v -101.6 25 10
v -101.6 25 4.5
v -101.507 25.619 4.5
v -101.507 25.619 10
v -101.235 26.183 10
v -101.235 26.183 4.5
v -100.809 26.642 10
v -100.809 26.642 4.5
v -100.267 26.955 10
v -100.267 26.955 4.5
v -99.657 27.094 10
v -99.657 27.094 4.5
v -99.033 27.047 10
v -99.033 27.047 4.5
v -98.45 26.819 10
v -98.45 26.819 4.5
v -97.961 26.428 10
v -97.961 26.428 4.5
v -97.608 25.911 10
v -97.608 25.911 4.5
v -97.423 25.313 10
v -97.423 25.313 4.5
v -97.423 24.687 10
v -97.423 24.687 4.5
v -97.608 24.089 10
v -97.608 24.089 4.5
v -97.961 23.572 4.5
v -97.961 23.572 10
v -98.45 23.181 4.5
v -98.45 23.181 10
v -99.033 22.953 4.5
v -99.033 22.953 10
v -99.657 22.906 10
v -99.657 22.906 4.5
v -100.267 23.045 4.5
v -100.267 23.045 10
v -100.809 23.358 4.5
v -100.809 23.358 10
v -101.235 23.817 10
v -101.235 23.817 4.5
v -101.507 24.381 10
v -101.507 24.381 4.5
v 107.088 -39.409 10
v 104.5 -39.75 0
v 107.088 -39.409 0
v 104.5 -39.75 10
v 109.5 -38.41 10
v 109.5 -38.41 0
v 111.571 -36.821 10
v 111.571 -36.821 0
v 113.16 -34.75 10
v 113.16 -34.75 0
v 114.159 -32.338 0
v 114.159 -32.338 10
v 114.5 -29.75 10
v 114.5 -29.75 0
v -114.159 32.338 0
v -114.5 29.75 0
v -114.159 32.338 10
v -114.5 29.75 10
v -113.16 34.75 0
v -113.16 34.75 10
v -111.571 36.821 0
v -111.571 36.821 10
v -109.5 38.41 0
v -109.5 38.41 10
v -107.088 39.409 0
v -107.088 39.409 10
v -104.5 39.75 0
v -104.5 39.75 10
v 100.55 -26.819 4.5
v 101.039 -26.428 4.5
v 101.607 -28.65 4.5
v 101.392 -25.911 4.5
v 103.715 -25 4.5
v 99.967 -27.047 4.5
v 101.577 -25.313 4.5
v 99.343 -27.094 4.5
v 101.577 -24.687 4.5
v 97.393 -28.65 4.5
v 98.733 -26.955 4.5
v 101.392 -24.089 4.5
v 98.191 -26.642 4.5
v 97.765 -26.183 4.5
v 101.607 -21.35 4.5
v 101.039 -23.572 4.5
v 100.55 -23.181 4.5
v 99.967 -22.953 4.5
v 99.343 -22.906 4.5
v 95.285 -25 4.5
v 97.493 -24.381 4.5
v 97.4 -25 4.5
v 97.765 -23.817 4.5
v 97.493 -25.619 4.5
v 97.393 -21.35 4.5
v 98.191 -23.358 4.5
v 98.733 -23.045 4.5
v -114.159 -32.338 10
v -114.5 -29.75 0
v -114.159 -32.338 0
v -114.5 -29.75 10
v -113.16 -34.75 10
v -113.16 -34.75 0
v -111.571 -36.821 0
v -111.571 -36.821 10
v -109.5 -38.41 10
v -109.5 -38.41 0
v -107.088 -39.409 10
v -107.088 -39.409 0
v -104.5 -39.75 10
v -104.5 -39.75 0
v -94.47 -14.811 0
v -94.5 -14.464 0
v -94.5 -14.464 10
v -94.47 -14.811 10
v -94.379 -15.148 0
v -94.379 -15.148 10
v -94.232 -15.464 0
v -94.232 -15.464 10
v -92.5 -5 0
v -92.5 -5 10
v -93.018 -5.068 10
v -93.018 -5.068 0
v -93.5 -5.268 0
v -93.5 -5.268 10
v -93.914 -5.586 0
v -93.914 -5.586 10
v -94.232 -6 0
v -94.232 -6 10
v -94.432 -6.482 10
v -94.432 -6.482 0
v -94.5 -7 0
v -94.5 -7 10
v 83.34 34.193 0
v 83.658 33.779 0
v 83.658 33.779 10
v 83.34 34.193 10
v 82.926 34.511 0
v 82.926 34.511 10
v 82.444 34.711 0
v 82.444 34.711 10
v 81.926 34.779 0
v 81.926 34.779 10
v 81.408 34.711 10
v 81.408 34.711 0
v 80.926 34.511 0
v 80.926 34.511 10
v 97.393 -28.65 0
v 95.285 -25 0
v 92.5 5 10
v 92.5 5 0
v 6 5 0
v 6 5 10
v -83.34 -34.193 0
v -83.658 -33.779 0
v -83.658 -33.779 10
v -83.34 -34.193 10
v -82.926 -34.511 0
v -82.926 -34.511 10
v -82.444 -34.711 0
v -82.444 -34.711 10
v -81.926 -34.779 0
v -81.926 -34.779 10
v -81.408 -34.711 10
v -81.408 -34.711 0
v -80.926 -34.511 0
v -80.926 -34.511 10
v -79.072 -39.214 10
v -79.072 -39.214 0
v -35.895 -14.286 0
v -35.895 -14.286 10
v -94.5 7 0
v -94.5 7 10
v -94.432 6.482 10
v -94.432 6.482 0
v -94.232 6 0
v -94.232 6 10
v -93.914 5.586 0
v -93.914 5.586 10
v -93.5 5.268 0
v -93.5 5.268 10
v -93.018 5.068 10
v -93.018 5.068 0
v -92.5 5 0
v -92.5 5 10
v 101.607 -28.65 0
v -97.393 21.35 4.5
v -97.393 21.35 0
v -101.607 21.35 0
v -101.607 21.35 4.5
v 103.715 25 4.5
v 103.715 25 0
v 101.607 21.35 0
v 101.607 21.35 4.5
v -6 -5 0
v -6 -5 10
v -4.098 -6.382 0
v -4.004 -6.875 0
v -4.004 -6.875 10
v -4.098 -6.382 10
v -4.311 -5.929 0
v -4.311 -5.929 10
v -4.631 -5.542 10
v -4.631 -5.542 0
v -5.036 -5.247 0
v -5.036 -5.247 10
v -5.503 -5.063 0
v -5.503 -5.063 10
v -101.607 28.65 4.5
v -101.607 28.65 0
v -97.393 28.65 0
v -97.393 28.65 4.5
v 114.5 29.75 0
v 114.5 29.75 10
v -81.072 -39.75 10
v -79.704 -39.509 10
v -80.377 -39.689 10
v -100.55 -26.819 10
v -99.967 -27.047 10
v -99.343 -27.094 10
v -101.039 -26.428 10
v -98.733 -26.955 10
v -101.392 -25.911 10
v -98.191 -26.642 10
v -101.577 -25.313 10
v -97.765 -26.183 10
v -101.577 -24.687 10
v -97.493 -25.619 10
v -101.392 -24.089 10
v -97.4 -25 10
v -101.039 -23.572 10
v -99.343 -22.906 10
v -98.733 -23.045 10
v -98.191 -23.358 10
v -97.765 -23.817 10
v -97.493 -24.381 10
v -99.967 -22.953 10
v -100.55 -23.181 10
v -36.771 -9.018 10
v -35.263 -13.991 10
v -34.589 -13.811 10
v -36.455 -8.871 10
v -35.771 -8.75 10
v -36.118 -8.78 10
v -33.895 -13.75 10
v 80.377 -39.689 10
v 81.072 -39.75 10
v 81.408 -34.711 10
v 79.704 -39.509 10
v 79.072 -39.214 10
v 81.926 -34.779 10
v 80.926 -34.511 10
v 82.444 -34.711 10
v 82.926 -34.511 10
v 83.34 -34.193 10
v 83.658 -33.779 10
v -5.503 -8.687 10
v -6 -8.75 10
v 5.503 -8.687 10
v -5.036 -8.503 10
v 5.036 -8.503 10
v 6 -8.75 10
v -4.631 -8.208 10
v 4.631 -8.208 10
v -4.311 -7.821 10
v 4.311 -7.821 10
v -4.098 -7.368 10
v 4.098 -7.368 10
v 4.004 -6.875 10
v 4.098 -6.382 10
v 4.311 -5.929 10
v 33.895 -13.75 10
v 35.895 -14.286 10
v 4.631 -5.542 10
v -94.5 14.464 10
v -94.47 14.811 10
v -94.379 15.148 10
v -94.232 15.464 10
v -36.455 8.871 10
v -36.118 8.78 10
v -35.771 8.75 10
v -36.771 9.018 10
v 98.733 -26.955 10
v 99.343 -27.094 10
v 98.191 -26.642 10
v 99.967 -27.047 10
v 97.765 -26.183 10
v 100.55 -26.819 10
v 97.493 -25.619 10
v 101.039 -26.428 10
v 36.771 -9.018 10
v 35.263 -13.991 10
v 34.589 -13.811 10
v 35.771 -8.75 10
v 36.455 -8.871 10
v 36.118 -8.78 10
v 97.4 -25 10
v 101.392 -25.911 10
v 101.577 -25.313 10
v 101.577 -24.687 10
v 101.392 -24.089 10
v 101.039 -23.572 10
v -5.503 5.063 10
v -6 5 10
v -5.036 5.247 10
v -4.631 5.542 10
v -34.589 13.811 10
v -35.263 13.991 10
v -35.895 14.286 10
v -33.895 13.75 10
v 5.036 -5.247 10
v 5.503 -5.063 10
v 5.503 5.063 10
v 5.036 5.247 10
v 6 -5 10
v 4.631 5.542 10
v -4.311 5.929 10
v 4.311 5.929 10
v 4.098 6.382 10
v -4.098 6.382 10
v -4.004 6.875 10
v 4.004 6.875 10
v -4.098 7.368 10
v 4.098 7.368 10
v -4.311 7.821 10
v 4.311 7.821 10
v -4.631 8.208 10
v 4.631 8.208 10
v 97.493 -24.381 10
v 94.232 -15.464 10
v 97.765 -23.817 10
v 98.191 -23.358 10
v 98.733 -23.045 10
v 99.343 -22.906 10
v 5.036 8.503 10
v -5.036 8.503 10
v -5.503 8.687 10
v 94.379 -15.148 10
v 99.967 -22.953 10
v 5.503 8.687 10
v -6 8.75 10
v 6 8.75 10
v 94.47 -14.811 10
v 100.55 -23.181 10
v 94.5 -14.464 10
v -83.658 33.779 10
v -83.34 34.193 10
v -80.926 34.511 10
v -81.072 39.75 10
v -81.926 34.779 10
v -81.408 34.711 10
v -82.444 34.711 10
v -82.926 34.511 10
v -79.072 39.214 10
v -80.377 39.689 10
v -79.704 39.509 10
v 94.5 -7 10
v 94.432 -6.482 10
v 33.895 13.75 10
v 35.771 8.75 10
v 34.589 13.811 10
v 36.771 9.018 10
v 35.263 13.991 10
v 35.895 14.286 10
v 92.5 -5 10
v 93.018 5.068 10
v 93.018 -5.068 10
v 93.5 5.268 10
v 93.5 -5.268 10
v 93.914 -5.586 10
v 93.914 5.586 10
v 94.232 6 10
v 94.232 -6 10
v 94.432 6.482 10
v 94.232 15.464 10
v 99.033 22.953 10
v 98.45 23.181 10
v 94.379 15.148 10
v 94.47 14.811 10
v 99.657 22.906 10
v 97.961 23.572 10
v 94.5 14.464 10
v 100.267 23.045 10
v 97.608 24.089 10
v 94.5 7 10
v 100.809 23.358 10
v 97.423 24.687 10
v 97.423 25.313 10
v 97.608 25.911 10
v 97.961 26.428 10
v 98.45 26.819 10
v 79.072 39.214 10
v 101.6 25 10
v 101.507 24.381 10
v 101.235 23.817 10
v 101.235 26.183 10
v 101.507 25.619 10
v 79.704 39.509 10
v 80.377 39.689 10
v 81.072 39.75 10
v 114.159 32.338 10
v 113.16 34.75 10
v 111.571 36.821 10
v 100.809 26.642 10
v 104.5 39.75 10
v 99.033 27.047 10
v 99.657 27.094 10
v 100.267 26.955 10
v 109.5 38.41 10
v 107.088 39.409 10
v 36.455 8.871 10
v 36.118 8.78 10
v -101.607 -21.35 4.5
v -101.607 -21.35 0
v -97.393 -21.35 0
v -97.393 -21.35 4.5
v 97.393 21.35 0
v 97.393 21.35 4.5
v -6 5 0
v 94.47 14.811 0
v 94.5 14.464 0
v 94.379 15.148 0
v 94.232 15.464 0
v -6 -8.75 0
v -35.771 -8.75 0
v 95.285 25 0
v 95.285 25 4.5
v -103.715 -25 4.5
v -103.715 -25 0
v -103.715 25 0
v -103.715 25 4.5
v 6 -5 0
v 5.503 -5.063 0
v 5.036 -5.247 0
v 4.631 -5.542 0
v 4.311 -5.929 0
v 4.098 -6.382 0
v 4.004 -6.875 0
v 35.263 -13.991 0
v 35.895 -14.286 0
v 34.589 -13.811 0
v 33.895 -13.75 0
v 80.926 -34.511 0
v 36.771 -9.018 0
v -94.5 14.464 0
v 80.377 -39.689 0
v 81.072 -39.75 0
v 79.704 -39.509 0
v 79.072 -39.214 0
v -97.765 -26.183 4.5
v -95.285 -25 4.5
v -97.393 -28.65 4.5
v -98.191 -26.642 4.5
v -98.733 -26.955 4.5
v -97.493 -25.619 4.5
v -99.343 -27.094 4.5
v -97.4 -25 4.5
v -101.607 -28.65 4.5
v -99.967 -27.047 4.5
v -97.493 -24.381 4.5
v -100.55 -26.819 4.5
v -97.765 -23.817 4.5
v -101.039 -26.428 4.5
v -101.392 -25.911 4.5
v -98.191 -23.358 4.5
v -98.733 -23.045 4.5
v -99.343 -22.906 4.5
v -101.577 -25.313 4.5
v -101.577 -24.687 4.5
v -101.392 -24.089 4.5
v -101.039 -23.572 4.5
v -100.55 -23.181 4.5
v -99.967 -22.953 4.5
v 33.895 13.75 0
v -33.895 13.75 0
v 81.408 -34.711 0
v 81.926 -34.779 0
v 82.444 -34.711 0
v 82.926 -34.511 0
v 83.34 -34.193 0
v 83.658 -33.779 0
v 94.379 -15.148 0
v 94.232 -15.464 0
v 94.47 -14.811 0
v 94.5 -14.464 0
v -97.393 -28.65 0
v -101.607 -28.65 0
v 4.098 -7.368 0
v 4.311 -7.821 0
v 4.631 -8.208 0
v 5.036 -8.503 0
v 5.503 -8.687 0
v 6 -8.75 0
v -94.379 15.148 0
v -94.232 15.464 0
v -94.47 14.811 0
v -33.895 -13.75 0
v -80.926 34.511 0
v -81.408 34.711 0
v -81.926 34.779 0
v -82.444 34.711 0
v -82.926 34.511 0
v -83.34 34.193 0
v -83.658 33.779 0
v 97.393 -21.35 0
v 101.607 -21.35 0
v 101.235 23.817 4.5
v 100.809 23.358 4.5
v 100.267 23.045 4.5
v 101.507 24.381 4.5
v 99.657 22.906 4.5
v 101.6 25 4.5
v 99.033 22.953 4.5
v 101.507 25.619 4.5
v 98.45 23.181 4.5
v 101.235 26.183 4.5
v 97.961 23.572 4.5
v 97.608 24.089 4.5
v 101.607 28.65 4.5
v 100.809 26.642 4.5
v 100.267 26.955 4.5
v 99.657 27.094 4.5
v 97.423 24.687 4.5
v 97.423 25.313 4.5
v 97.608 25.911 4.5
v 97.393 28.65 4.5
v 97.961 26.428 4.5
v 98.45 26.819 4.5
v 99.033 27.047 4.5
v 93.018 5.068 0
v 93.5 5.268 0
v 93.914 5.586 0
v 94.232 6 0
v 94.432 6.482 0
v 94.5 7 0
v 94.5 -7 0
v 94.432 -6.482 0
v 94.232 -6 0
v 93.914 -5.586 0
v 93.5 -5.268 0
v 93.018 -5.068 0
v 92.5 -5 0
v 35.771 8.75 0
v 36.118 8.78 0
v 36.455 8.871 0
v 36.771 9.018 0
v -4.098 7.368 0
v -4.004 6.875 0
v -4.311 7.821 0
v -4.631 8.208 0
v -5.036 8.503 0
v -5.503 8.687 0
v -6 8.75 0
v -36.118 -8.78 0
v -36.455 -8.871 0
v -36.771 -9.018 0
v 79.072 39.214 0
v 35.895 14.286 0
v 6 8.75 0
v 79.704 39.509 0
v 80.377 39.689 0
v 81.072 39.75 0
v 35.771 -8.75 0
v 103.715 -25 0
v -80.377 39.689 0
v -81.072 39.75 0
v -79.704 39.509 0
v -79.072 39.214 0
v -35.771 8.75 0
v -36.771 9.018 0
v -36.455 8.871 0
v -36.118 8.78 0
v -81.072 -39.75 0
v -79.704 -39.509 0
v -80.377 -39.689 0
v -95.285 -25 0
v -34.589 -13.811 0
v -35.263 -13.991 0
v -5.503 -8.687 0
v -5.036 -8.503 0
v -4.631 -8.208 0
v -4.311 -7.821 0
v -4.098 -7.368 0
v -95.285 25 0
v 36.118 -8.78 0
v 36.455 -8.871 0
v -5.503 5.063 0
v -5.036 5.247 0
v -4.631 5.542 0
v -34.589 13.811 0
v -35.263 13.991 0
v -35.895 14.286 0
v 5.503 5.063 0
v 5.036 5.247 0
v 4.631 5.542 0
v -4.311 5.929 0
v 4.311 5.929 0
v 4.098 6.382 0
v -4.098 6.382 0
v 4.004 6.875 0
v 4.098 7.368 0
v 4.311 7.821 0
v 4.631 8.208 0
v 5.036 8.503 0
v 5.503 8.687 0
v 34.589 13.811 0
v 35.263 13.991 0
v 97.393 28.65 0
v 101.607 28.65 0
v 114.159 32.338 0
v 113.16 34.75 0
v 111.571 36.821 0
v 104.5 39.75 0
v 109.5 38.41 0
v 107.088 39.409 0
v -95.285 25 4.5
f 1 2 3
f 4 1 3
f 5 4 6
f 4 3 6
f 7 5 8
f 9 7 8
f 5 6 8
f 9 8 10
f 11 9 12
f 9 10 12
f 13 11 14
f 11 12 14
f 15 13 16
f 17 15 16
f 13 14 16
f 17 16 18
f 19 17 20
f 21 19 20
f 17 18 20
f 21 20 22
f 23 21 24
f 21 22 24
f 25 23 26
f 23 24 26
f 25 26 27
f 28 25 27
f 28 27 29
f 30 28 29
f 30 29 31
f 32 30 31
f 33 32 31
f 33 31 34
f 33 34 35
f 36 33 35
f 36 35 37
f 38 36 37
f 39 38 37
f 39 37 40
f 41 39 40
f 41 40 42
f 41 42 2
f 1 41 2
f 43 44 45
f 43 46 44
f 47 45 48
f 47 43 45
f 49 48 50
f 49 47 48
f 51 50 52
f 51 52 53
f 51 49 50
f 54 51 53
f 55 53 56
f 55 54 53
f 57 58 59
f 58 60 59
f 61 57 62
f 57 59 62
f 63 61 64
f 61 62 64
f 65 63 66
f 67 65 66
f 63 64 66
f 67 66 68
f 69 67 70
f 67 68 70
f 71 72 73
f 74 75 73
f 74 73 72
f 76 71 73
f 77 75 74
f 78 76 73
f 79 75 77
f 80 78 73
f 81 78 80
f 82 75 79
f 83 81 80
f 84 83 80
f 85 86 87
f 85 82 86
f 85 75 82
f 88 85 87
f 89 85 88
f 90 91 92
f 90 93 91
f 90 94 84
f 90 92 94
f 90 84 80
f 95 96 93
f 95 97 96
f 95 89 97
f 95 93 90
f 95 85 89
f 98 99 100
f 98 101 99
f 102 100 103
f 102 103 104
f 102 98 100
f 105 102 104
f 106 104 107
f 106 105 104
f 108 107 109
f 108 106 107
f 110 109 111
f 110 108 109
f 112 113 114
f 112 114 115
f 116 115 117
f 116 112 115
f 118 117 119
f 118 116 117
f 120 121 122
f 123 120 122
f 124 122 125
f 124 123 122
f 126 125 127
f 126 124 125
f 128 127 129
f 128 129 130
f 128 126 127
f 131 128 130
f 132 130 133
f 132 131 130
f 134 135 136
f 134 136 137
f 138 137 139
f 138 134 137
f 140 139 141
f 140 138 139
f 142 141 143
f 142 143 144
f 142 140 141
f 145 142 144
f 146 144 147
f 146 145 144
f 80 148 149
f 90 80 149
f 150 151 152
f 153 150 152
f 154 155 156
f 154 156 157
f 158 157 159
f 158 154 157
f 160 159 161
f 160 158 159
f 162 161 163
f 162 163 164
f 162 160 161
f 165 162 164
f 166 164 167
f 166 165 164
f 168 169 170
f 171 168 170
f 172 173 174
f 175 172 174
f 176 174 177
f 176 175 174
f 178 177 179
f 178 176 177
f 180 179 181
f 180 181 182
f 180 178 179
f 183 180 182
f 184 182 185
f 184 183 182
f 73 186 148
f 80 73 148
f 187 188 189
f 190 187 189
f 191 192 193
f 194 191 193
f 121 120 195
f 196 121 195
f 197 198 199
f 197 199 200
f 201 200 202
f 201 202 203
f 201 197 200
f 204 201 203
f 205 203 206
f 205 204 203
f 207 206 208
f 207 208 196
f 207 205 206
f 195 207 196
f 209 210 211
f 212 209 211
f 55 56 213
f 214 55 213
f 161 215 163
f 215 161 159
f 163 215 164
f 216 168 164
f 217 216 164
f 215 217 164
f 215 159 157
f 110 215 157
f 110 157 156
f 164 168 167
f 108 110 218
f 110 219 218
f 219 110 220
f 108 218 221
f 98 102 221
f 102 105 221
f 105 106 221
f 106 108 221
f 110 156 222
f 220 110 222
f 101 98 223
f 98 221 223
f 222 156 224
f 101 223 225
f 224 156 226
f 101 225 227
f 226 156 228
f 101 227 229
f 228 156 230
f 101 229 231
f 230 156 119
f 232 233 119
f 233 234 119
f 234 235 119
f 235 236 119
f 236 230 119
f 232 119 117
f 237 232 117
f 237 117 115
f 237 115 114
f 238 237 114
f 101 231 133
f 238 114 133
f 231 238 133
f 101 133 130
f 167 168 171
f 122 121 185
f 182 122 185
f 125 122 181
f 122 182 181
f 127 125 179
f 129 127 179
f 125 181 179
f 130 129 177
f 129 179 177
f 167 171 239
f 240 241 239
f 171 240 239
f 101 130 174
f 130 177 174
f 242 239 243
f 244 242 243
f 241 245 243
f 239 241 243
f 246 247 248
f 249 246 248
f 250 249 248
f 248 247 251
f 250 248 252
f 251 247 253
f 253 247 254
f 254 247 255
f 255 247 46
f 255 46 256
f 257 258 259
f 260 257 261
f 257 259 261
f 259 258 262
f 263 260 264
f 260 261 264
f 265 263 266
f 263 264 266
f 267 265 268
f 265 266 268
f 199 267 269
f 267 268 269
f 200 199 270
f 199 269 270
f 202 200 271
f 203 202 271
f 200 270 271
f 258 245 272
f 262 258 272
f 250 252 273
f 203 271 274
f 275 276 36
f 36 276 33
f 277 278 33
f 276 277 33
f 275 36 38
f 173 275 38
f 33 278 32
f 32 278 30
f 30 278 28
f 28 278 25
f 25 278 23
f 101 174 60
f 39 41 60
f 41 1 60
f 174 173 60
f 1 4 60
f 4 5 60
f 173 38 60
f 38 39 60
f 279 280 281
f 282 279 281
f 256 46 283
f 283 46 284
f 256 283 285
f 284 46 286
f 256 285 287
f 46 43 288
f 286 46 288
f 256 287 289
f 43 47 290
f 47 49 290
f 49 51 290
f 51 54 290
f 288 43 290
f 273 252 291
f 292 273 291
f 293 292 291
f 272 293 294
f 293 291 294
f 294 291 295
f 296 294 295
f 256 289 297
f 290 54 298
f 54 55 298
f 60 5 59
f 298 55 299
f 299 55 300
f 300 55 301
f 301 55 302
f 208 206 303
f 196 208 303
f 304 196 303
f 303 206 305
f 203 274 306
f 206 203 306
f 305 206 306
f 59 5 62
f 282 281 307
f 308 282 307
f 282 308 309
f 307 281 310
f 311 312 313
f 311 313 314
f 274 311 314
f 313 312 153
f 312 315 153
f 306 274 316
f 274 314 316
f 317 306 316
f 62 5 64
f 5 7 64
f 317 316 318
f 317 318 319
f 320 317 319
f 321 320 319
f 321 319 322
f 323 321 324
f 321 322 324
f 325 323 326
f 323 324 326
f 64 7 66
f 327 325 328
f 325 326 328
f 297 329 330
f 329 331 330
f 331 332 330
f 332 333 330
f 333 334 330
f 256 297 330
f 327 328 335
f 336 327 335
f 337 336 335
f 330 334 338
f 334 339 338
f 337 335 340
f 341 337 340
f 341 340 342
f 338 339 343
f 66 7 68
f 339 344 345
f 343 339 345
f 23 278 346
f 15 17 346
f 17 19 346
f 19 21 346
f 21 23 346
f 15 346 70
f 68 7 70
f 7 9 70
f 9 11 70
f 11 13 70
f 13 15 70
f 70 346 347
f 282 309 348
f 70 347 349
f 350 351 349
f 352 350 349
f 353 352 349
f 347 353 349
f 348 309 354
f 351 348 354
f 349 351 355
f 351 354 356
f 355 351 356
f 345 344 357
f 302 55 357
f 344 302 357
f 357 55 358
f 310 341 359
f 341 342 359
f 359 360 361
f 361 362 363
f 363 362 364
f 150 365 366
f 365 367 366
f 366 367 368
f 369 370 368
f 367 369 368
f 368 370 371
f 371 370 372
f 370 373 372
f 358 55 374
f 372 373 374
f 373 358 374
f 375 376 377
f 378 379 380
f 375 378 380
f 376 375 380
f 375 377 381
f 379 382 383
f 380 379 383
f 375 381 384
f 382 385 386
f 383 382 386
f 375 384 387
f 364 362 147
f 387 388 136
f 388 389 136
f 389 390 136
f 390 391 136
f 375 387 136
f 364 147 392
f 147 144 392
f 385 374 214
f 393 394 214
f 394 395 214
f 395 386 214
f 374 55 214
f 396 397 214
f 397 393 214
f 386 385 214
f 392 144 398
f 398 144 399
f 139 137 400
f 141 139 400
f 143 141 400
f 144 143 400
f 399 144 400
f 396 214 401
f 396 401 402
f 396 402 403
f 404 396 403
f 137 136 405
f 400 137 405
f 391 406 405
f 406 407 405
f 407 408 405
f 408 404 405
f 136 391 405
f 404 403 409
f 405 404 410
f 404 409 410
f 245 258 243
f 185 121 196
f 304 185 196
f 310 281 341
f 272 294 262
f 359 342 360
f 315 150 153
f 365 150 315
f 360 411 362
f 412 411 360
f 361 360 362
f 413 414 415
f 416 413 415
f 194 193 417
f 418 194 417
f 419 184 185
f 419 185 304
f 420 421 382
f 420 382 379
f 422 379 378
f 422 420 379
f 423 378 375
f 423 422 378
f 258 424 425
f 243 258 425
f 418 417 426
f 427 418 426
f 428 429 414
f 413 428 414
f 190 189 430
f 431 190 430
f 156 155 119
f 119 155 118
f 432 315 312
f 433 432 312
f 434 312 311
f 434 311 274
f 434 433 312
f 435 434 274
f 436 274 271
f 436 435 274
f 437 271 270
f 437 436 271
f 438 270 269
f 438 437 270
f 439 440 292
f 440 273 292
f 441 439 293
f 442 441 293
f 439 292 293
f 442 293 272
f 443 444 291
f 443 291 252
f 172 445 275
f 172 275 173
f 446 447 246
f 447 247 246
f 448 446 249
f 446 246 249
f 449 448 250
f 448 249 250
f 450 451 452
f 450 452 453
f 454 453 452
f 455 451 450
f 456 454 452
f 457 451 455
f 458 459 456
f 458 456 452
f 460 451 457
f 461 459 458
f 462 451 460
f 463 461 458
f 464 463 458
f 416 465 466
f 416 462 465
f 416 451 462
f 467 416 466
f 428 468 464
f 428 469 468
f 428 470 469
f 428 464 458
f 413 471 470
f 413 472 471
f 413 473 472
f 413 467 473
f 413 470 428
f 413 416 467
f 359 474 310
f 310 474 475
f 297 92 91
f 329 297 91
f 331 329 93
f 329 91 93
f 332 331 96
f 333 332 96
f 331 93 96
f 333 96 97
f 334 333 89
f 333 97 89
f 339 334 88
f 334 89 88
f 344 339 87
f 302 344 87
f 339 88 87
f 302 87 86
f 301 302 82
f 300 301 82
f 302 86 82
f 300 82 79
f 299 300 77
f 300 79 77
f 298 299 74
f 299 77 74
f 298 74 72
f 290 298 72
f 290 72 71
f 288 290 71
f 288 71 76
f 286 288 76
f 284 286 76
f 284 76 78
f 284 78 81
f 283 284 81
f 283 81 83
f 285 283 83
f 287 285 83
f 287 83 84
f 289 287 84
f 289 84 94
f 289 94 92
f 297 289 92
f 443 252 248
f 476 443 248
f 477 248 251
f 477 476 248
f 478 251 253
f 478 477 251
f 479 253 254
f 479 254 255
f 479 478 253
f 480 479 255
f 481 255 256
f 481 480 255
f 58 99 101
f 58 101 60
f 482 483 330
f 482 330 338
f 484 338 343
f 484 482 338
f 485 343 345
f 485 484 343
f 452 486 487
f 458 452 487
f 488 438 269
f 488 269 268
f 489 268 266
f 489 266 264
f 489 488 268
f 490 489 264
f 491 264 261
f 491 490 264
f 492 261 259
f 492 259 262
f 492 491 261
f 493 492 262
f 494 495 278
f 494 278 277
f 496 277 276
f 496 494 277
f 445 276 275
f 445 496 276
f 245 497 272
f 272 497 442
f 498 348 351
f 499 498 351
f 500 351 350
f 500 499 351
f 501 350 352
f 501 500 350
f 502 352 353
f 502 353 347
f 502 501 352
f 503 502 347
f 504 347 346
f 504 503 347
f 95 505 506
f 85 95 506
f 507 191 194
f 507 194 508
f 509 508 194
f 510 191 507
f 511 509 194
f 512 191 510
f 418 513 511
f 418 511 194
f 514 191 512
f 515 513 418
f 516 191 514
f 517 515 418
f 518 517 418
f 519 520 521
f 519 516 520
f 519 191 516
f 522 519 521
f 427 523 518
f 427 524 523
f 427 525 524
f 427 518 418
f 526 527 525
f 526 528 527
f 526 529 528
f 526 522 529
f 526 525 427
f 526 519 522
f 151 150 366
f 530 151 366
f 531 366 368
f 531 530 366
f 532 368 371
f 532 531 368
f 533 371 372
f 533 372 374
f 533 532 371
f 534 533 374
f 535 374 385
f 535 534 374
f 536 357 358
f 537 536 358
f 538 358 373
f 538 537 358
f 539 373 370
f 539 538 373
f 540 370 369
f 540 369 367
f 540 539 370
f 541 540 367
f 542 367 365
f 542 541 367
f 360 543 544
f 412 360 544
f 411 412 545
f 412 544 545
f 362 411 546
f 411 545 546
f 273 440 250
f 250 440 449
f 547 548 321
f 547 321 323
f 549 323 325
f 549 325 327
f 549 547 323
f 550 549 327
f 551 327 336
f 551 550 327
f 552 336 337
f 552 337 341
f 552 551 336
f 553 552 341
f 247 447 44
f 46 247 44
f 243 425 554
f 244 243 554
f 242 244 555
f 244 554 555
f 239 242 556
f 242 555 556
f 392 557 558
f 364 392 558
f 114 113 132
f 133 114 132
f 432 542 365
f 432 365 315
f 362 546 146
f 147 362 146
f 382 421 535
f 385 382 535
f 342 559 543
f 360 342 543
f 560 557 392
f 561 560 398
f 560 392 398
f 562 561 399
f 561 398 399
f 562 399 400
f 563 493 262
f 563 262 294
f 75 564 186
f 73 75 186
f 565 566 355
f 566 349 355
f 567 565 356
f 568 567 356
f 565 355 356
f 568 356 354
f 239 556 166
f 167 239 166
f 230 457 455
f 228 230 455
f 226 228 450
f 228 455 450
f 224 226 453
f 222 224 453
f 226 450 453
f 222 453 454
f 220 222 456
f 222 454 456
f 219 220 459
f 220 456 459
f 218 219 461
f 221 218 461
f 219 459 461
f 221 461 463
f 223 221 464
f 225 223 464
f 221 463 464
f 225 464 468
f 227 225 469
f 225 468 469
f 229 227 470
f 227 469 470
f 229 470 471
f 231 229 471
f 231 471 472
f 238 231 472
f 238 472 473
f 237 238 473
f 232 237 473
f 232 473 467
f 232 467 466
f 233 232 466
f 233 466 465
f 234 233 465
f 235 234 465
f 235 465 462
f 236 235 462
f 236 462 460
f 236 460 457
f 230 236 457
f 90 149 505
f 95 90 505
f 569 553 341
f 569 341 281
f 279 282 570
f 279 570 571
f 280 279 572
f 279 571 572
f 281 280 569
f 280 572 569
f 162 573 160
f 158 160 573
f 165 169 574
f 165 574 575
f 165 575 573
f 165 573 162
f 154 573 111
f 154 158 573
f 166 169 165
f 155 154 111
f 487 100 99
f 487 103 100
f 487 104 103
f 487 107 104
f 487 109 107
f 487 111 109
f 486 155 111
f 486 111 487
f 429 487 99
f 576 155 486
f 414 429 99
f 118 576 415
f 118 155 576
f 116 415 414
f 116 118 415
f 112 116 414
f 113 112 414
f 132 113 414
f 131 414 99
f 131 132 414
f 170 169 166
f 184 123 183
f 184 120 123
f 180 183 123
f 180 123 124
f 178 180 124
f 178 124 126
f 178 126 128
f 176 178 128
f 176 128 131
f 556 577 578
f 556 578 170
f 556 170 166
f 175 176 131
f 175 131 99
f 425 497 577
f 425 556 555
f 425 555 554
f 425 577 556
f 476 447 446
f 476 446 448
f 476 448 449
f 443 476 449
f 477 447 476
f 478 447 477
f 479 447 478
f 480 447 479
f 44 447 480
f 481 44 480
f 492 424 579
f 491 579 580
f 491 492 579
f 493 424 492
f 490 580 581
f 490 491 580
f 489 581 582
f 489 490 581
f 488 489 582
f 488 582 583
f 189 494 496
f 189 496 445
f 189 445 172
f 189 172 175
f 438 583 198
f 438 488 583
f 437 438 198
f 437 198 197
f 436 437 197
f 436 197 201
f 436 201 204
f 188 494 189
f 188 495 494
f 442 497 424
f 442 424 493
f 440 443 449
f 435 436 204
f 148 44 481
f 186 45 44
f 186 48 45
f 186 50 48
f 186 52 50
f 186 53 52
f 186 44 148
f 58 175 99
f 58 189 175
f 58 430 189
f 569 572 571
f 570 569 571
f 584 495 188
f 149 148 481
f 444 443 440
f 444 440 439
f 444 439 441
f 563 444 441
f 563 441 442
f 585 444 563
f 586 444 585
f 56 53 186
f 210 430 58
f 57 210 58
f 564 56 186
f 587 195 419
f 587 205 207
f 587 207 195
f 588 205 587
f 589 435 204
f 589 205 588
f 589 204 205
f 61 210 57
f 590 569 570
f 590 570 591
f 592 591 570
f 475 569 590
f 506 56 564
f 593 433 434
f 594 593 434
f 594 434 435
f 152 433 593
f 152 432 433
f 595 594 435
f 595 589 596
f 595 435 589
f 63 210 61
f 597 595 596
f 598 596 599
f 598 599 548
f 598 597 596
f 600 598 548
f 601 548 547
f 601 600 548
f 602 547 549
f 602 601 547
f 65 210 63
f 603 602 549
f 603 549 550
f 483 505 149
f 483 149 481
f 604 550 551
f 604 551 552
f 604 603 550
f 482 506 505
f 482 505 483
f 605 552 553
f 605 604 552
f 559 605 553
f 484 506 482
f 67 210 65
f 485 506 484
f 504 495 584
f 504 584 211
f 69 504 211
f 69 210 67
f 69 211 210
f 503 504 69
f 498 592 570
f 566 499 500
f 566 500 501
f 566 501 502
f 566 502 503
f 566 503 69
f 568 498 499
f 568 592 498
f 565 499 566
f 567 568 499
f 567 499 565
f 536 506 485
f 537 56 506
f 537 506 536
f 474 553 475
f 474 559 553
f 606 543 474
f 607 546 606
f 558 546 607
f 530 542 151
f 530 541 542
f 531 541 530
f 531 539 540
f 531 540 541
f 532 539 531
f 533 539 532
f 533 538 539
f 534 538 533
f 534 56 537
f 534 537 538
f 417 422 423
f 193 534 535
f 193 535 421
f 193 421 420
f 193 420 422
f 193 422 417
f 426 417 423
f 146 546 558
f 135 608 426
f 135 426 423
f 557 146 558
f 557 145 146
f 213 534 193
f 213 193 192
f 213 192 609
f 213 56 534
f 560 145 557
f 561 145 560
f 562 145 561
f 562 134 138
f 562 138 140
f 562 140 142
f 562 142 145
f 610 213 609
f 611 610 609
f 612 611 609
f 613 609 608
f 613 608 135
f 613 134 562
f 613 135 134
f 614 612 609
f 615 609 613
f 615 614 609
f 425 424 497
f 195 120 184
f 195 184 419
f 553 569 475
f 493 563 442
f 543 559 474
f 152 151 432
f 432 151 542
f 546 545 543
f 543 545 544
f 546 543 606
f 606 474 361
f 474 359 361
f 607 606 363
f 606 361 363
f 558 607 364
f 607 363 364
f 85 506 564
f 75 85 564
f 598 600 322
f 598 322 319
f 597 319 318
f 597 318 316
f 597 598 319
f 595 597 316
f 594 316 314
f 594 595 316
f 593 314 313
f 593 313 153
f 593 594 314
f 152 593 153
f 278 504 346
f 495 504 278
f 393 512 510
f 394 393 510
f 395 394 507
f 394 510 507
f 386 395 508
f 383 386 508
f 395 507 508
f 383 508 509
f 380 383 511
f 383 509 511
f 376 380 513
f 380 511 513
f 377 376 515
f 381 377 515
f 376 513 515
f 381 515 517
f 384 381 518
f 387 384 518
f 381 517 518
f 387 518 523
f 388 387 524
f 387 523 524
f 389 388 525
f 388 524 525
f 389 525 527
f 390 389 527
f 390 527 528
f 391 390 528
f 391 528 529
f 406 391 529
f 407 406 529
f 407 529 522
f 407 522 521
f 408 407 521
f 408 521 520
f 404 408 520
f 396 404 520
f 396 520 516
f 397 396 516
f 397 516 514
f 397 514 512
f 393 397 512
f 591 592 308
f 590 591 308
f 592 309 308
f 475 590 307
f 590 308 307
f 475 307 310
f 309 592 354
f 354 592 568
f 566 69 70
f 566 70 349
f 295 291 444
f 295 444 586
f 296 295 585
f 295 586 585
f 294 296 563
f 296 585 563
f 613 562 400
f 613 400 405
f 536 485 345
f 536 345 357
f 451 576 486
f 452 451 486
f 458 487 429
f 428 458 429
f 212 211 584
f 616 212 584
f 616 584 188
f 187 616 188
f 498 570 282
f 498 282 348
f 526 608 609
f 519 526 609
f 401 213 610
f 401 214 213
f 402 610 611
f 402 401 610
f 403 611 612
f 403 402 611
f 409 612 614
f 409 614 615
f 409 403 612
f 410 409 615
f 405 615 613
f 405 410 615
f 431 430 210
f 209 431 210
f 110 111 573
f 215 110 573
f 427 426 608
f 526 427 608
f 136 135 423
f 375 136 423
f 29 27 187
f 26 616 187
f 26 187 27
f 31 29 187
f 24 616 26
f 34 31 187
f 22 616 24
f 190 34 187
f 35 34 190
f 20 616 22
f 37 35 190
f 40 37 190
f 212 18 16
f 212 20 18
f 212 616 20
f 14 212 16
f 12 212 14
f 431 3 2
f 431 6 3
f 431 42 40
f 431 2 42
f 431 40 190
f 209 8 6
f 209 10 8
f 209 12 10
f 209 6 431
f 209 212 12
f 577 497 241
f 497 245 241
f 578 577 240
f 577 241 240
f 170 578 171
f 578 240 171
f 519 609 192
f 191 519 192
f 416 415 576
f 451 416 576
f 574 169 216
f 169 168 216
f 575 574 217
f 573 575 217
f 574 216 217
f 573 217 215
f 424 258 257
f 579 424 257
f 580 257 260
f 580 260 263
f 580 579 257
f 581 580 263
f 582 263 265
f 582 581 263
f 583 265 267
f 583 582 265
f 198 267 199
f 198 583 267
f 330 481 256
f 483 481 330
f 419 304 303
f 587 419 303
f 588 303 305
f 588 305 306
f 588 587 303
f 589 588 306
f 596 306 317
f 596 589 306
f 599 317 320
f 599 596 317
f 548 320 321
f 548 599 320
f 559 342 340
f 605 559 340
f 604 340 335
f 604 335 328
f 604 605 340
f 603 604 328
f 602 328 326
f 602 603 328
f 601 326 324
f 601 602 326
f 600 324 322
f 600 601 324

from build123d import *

# Parameters (mm, degrees)
SKETCH_1_W          = 229
SKETCH_1_H          = 79.5
EXTRUDE_1_DEPTH     = 10
FILLET_1_R          = 10
SKETCH_2_R          = 2.1
CUT_EXTRUDE_1_DEPTH = 122.615428709
CUT_EXTRUDE_2_DEPTH = 4.5
CUT_EXTRUDE_3_DEPTH = 122.615428709
FILLET_2_R          = 4
CUT_EXTRUDE_4_DEPTH = 122.615428709
FILLET_3_R          = 2


with BuildPart() as part:
    # 草图1 → 凸台-拉伸1 (new body)
    with BuildSketch(Plane.XY):
        Rectangle(SKETCH_1_W, SKETCH_1_H)
    extrude(amount=EXTRUDE_1_DEPTH)

    # 圆角1
    fillet_1_edges = [part.edges().sort_by_distance(p)[0] for p in [
        (114.5, -39.75, 5),
        (-114.5, -39.75, 5),
        (-114.5, 39.75, 5),
        (114.5, 39.75, 5),
    ]]
    fillet(fillet_1_edges, radius=FILLET_1_R)

    # 草图2 → 切除-拉伸1 (cut, through all)
    with BuildSketch(Plane(origin=(0, 0, 0), x_dir=(-1, 0, 0), z_dir=(0, 0, -1))):
        with Locations((99.5, 25)):
            Circle(SKETCH_2_R)
        with Locations(Location((99.5, -25, 0), (0, 0, 180))):
            Circle(SKETCH_2_R)
        with Locations((-99.5, -25)):
            Circle(SKETCH_2_R)
        with Locations(Location((-99.5, 25, 0), (0, 0, 180))):
            Circle(SKETCH_2_R)
    extrude(amount=-CUT_EXTRUDE_1_DEPTH, mode=Mode.SUBTRACT)

    # 草图3 → 切除-拉伸2 (cut)
    with BuildSketch(Plane(origin=(0, 0, 0), x_dir=(-1, 0, 0), z_dir=(0, 0, -1))):
        Polygon((-97.392671517, 21.35), (-95.285343035, 25), (-97.392671517, 28.65), (-101.607328483, 28.65), (-103.714656965, 25), (-101.607328483, 21.35), align=None)
        Polygon((-97.392671517, -28.65), (-95.285343035, -25), (-97.392671517, -21.35), (-101.607328483, -21.35), (-103.714656965, -25), (-101.607328483, -28.65), align=None)
        Polygon((101.607328483, 21.35), (103.714656965, 25), (101.607328483, 28.65), (97.392671517, 28.65), (95.285343035, 25), (97.392671517, 21.35), align=None)
        Polygon((101.607328483, -28.65), (103.714656965, -25), (101.607328483, -21.35), (97.392671517, -21.35), (95.285343035, -25), (97.392671517, -28.65), align=None)
    extrude(amount=-CUT_EXTRUDE_2_DEPTH, mode=Mode.SUBTRACT)

    # 草图4 → 切除-拉伸3 (cut, through all)
    with BuildSketch(Plane(origin=(0, 0, 0), x_dir=(-1, 0, 0), z_dir=(0, 0, -1))):
        Polygon((-80, 39.75), (-34.966679003, 13.75), (34.966679003, 13.75), (80, 39.75), align=None)
        Polygon((80, -39.75), (34.966679003, -13.75), (-34.966679003, -13.75), (-80, -39.75), align=None)
    extrude(amount=-CUT_EXTRUDE_3_DEPTH, mode=Mode.SUBTRACT)

    # 圆角2
    fillet_2_edges = [part.edges().sort_by_distance(p)[0] for p in [
        (80, 39.75, 5),
        (-80, 39.75, 5),
        (-34.966679003, 13.75, 5),
        (34.966679003, 13.75, 5),
        (-80, -39.75, 5),
        (80, -39.75, 5),
        (34.966679003, -13.75, 5),
        (-34.966679003, -13.75, 5),
    ]]
    fillet(fillet_2_edges, radius=FILLET_2_R)

    # 草图6 → 切除-拉伸4 (cut, through all)
    with BuildSketch(Plane(origin=(0, 0, 0), x_dir=(-1, 0, 0), z_dir=(0, 0, -1))):
        Polygon((-82.657935628, 35.511057159), (-94.5, 15), (-94.5, 5), (-4, 5), (-4, 8.75), (-36.306424965, 8.75), align=None)
        Polygon((36.306424965, 8.75), (82.657935628, 35.511057159), (94.5, 15), (94.5, 5), (4, 5), (4, 8.75), align=None)
        Polygon((82.657935628, -35.511057159), (94.5, -15), (94.5, -5), (4, -5), (4, -8.75), (36.306424965, -8.75), align=None)
        Polygon((-36.306424965, -8.75), (-82.657935628, -35.511057159), (-94.5, -15), (-94.5, -5), (-4, -5), (-4, -8.75), align=None)
    extrude(amount=-CUT_EXTRUDE_4_DEPTH, mode=Mode.SUBTRACT)

    # 圆角3
    # the kernel refuses this fillet: 2 mm, written as the material it adds along each edge
    with BuildSketch(Plane(origin=(4, 8.75, 0), x_dir=(0, -1, 0), z_dir=(0, 0, 1)), Plane(origin=(94.5, 5, 0), x_dir=(0, 1, 0), z_dir=(0, 0, 1)), Plane(origin=(4, 5, 0), x_dir=(1, 0, 0), z_dir=(0, 0, 1)), Plane(origin=(-82.657935628, 35.511057159, 0), x_dir=(-0.499999999999999, -0.8660254037844393, 0), z_dir=(0, 0, 1)), Plane(origin=(-4, 5, 0), x_dir=(0, 1, 0), z_dir=(0, 0, 1)), Plane(origin=(-4, 8.75, 0), x_dir=(-1, 0, 0), z_dir=(0, 0, 1)), Plane(origin=(-94.5, 5, 0), x_dir=(1, 0, 0), z_dir=(0, 0, 1)), Plane(origin=(82.657935628, -35.511057159, 0), x_dir=(0.5000000000000006, 0.8660254037844384, 0), z_dir=(0, 0, 1)), Plane(origin=(94.5, -5, 0), x_dir=(-1, 0, 0), z_dir=(0, 0, 1)), Plane(origin=(4, -5, 0), x_dir=(0, -1, 0), z_dir=(0, 0, 1)), Plane(origin=(4, -8.75, 0), x_dir=(1, 0, 0), z_dir=(0, 0, 1)), Plane(origin=(-4, -8.75, 0), x_dir=(0, 1, 0), z_dir=(0, 0, 1)), Plane(origin=(-4, -5, 0), x_dir=(-1, 0, 0), z_dir=(0, 0, 1)), Plane(origin=(-94.5, -5, 0), x_dir=(0, -1, 0), z_dir=(0, 0, 1))) as fillet_3_piece_1:
        with BuildLine():
            CenterArc((FILLET_3_R, FILLET_3_R), FILLET_3_R, 180, 90)
            Line((0, FILLET_3_R), (0, 0))
            Line((0, 0), (FILLET_3_R, 0))
        make_face()
    extrude(amount=10)
    with BuildSketch(Plane(origin=(94.5, 15, 0), x_dir=(-0.5000000000000042, 0.8660254037844363, 0), z_dir=(0, 0, 1)), Plane(origin=(-94.5, 15, 0), x_dir=(0, -1, 0), z_dir=(0, 0, 1)), Plane(origin=(94.5, -15, 0), x_dir=(0, 1, 0), z_dir=(0, 0, 1)), Plane(origin=(-94.5, -15, 0), x_dir=(0.49999999999999856, -0.8660254037844396, 0), z_dir=(0, 0, 1))) as fillet_3_piece_2:
        with BuildLine():
            CenterArc((FILLET_3_R * 0.267949192431, FILLET_3_R), FILLET_3_R, 240, 30)
            Line((-FILLET_3_R * 0.232050807569, FILLET_3_R * 0.133974596216), (0, 0))
            Line((0, 0), (FILLET_3_R * 0.267949192431, 0))
        make_face()
    extrude(amount=10)
    with BuildSketch(Plane(origin=(82.657935628, 35.511057159, 0), x_dir=(0.499999999999999, -0.8660254037844393, 0), z_dir=(0, 0, 1)), Plane(origin=(-82.657935628, -35.511057159, 0), x_dir=(-0.499999999999999, 0.8660254037844393, 0), z_dir=(0, 0, 1))) as fillet_3_piece_3:
        with BuildLine():
            CenterArc((FILLET_3_R, -FILLET_3_R), FILLET_3_R, 90, 90)
            Line((0, -FILLET_3_R), (0, 0))
            Line((0, 0), (FILLET_3_R, 0))
        make_face()
    extrude(amount=10)
    # the kernel refuses this fillet: 2 mm, written as the material it takes off along each edge
    with BuildSketch(Plane(origin=(36.306424965, 8.75, -1.339745962), x_dir=(-1, 0, 0), z_dir=(0, 0, 1)), Plane(origin=(-36.306424965, -8.75, -1.339745962), x_dir=(1, 0, 0), z_dir=(0, 0, 1))) as fillet_3_2_piece_1:
        with BuildLine():
            CenterArc((FILLET_3_R * 0.267949192431, -FILLET_3_R), FILLET_3_R, 90, 30)
            Line((-FILLET_3_R * 0.232050807569, -FILLET_3_R * 0.133974596216), (0, 0))
            Line((0, 0), (FILLET_3_R * 0.267949192431, 0))
        make_face()
    extrude(amount=12.679491924, mode=Mode.SUBTRACT)
    with BuildSketch(Plane(origin=(-36.306424965, 8.75, -1.339745962), x_dir=(1, 0, 0), z_dir=(0, 0, 1)), Plane(origin=(36.306424965, -8.75, -1.339745962), x_dir=(-1, 0, 0), z_dir=(0, 0, 1))) as fillet_3_2_piece_2:
        with BuildLine():
            CenterArc((FILLET_3_R * 0.267949192431, FILLET_3_R), FILLET_3_R, 240, 30)
            Line((-FILLET_3_R * 0.232050807569, FILLET_3_R * 0.133974596216), (0, 0))
            Line((0, 0), (FILLET_3_R * 0.267949192431, 0))
        make_face()
    extrude(amount=12.679491924, mode=Mode.SUBTRACT)


solid = part.part
